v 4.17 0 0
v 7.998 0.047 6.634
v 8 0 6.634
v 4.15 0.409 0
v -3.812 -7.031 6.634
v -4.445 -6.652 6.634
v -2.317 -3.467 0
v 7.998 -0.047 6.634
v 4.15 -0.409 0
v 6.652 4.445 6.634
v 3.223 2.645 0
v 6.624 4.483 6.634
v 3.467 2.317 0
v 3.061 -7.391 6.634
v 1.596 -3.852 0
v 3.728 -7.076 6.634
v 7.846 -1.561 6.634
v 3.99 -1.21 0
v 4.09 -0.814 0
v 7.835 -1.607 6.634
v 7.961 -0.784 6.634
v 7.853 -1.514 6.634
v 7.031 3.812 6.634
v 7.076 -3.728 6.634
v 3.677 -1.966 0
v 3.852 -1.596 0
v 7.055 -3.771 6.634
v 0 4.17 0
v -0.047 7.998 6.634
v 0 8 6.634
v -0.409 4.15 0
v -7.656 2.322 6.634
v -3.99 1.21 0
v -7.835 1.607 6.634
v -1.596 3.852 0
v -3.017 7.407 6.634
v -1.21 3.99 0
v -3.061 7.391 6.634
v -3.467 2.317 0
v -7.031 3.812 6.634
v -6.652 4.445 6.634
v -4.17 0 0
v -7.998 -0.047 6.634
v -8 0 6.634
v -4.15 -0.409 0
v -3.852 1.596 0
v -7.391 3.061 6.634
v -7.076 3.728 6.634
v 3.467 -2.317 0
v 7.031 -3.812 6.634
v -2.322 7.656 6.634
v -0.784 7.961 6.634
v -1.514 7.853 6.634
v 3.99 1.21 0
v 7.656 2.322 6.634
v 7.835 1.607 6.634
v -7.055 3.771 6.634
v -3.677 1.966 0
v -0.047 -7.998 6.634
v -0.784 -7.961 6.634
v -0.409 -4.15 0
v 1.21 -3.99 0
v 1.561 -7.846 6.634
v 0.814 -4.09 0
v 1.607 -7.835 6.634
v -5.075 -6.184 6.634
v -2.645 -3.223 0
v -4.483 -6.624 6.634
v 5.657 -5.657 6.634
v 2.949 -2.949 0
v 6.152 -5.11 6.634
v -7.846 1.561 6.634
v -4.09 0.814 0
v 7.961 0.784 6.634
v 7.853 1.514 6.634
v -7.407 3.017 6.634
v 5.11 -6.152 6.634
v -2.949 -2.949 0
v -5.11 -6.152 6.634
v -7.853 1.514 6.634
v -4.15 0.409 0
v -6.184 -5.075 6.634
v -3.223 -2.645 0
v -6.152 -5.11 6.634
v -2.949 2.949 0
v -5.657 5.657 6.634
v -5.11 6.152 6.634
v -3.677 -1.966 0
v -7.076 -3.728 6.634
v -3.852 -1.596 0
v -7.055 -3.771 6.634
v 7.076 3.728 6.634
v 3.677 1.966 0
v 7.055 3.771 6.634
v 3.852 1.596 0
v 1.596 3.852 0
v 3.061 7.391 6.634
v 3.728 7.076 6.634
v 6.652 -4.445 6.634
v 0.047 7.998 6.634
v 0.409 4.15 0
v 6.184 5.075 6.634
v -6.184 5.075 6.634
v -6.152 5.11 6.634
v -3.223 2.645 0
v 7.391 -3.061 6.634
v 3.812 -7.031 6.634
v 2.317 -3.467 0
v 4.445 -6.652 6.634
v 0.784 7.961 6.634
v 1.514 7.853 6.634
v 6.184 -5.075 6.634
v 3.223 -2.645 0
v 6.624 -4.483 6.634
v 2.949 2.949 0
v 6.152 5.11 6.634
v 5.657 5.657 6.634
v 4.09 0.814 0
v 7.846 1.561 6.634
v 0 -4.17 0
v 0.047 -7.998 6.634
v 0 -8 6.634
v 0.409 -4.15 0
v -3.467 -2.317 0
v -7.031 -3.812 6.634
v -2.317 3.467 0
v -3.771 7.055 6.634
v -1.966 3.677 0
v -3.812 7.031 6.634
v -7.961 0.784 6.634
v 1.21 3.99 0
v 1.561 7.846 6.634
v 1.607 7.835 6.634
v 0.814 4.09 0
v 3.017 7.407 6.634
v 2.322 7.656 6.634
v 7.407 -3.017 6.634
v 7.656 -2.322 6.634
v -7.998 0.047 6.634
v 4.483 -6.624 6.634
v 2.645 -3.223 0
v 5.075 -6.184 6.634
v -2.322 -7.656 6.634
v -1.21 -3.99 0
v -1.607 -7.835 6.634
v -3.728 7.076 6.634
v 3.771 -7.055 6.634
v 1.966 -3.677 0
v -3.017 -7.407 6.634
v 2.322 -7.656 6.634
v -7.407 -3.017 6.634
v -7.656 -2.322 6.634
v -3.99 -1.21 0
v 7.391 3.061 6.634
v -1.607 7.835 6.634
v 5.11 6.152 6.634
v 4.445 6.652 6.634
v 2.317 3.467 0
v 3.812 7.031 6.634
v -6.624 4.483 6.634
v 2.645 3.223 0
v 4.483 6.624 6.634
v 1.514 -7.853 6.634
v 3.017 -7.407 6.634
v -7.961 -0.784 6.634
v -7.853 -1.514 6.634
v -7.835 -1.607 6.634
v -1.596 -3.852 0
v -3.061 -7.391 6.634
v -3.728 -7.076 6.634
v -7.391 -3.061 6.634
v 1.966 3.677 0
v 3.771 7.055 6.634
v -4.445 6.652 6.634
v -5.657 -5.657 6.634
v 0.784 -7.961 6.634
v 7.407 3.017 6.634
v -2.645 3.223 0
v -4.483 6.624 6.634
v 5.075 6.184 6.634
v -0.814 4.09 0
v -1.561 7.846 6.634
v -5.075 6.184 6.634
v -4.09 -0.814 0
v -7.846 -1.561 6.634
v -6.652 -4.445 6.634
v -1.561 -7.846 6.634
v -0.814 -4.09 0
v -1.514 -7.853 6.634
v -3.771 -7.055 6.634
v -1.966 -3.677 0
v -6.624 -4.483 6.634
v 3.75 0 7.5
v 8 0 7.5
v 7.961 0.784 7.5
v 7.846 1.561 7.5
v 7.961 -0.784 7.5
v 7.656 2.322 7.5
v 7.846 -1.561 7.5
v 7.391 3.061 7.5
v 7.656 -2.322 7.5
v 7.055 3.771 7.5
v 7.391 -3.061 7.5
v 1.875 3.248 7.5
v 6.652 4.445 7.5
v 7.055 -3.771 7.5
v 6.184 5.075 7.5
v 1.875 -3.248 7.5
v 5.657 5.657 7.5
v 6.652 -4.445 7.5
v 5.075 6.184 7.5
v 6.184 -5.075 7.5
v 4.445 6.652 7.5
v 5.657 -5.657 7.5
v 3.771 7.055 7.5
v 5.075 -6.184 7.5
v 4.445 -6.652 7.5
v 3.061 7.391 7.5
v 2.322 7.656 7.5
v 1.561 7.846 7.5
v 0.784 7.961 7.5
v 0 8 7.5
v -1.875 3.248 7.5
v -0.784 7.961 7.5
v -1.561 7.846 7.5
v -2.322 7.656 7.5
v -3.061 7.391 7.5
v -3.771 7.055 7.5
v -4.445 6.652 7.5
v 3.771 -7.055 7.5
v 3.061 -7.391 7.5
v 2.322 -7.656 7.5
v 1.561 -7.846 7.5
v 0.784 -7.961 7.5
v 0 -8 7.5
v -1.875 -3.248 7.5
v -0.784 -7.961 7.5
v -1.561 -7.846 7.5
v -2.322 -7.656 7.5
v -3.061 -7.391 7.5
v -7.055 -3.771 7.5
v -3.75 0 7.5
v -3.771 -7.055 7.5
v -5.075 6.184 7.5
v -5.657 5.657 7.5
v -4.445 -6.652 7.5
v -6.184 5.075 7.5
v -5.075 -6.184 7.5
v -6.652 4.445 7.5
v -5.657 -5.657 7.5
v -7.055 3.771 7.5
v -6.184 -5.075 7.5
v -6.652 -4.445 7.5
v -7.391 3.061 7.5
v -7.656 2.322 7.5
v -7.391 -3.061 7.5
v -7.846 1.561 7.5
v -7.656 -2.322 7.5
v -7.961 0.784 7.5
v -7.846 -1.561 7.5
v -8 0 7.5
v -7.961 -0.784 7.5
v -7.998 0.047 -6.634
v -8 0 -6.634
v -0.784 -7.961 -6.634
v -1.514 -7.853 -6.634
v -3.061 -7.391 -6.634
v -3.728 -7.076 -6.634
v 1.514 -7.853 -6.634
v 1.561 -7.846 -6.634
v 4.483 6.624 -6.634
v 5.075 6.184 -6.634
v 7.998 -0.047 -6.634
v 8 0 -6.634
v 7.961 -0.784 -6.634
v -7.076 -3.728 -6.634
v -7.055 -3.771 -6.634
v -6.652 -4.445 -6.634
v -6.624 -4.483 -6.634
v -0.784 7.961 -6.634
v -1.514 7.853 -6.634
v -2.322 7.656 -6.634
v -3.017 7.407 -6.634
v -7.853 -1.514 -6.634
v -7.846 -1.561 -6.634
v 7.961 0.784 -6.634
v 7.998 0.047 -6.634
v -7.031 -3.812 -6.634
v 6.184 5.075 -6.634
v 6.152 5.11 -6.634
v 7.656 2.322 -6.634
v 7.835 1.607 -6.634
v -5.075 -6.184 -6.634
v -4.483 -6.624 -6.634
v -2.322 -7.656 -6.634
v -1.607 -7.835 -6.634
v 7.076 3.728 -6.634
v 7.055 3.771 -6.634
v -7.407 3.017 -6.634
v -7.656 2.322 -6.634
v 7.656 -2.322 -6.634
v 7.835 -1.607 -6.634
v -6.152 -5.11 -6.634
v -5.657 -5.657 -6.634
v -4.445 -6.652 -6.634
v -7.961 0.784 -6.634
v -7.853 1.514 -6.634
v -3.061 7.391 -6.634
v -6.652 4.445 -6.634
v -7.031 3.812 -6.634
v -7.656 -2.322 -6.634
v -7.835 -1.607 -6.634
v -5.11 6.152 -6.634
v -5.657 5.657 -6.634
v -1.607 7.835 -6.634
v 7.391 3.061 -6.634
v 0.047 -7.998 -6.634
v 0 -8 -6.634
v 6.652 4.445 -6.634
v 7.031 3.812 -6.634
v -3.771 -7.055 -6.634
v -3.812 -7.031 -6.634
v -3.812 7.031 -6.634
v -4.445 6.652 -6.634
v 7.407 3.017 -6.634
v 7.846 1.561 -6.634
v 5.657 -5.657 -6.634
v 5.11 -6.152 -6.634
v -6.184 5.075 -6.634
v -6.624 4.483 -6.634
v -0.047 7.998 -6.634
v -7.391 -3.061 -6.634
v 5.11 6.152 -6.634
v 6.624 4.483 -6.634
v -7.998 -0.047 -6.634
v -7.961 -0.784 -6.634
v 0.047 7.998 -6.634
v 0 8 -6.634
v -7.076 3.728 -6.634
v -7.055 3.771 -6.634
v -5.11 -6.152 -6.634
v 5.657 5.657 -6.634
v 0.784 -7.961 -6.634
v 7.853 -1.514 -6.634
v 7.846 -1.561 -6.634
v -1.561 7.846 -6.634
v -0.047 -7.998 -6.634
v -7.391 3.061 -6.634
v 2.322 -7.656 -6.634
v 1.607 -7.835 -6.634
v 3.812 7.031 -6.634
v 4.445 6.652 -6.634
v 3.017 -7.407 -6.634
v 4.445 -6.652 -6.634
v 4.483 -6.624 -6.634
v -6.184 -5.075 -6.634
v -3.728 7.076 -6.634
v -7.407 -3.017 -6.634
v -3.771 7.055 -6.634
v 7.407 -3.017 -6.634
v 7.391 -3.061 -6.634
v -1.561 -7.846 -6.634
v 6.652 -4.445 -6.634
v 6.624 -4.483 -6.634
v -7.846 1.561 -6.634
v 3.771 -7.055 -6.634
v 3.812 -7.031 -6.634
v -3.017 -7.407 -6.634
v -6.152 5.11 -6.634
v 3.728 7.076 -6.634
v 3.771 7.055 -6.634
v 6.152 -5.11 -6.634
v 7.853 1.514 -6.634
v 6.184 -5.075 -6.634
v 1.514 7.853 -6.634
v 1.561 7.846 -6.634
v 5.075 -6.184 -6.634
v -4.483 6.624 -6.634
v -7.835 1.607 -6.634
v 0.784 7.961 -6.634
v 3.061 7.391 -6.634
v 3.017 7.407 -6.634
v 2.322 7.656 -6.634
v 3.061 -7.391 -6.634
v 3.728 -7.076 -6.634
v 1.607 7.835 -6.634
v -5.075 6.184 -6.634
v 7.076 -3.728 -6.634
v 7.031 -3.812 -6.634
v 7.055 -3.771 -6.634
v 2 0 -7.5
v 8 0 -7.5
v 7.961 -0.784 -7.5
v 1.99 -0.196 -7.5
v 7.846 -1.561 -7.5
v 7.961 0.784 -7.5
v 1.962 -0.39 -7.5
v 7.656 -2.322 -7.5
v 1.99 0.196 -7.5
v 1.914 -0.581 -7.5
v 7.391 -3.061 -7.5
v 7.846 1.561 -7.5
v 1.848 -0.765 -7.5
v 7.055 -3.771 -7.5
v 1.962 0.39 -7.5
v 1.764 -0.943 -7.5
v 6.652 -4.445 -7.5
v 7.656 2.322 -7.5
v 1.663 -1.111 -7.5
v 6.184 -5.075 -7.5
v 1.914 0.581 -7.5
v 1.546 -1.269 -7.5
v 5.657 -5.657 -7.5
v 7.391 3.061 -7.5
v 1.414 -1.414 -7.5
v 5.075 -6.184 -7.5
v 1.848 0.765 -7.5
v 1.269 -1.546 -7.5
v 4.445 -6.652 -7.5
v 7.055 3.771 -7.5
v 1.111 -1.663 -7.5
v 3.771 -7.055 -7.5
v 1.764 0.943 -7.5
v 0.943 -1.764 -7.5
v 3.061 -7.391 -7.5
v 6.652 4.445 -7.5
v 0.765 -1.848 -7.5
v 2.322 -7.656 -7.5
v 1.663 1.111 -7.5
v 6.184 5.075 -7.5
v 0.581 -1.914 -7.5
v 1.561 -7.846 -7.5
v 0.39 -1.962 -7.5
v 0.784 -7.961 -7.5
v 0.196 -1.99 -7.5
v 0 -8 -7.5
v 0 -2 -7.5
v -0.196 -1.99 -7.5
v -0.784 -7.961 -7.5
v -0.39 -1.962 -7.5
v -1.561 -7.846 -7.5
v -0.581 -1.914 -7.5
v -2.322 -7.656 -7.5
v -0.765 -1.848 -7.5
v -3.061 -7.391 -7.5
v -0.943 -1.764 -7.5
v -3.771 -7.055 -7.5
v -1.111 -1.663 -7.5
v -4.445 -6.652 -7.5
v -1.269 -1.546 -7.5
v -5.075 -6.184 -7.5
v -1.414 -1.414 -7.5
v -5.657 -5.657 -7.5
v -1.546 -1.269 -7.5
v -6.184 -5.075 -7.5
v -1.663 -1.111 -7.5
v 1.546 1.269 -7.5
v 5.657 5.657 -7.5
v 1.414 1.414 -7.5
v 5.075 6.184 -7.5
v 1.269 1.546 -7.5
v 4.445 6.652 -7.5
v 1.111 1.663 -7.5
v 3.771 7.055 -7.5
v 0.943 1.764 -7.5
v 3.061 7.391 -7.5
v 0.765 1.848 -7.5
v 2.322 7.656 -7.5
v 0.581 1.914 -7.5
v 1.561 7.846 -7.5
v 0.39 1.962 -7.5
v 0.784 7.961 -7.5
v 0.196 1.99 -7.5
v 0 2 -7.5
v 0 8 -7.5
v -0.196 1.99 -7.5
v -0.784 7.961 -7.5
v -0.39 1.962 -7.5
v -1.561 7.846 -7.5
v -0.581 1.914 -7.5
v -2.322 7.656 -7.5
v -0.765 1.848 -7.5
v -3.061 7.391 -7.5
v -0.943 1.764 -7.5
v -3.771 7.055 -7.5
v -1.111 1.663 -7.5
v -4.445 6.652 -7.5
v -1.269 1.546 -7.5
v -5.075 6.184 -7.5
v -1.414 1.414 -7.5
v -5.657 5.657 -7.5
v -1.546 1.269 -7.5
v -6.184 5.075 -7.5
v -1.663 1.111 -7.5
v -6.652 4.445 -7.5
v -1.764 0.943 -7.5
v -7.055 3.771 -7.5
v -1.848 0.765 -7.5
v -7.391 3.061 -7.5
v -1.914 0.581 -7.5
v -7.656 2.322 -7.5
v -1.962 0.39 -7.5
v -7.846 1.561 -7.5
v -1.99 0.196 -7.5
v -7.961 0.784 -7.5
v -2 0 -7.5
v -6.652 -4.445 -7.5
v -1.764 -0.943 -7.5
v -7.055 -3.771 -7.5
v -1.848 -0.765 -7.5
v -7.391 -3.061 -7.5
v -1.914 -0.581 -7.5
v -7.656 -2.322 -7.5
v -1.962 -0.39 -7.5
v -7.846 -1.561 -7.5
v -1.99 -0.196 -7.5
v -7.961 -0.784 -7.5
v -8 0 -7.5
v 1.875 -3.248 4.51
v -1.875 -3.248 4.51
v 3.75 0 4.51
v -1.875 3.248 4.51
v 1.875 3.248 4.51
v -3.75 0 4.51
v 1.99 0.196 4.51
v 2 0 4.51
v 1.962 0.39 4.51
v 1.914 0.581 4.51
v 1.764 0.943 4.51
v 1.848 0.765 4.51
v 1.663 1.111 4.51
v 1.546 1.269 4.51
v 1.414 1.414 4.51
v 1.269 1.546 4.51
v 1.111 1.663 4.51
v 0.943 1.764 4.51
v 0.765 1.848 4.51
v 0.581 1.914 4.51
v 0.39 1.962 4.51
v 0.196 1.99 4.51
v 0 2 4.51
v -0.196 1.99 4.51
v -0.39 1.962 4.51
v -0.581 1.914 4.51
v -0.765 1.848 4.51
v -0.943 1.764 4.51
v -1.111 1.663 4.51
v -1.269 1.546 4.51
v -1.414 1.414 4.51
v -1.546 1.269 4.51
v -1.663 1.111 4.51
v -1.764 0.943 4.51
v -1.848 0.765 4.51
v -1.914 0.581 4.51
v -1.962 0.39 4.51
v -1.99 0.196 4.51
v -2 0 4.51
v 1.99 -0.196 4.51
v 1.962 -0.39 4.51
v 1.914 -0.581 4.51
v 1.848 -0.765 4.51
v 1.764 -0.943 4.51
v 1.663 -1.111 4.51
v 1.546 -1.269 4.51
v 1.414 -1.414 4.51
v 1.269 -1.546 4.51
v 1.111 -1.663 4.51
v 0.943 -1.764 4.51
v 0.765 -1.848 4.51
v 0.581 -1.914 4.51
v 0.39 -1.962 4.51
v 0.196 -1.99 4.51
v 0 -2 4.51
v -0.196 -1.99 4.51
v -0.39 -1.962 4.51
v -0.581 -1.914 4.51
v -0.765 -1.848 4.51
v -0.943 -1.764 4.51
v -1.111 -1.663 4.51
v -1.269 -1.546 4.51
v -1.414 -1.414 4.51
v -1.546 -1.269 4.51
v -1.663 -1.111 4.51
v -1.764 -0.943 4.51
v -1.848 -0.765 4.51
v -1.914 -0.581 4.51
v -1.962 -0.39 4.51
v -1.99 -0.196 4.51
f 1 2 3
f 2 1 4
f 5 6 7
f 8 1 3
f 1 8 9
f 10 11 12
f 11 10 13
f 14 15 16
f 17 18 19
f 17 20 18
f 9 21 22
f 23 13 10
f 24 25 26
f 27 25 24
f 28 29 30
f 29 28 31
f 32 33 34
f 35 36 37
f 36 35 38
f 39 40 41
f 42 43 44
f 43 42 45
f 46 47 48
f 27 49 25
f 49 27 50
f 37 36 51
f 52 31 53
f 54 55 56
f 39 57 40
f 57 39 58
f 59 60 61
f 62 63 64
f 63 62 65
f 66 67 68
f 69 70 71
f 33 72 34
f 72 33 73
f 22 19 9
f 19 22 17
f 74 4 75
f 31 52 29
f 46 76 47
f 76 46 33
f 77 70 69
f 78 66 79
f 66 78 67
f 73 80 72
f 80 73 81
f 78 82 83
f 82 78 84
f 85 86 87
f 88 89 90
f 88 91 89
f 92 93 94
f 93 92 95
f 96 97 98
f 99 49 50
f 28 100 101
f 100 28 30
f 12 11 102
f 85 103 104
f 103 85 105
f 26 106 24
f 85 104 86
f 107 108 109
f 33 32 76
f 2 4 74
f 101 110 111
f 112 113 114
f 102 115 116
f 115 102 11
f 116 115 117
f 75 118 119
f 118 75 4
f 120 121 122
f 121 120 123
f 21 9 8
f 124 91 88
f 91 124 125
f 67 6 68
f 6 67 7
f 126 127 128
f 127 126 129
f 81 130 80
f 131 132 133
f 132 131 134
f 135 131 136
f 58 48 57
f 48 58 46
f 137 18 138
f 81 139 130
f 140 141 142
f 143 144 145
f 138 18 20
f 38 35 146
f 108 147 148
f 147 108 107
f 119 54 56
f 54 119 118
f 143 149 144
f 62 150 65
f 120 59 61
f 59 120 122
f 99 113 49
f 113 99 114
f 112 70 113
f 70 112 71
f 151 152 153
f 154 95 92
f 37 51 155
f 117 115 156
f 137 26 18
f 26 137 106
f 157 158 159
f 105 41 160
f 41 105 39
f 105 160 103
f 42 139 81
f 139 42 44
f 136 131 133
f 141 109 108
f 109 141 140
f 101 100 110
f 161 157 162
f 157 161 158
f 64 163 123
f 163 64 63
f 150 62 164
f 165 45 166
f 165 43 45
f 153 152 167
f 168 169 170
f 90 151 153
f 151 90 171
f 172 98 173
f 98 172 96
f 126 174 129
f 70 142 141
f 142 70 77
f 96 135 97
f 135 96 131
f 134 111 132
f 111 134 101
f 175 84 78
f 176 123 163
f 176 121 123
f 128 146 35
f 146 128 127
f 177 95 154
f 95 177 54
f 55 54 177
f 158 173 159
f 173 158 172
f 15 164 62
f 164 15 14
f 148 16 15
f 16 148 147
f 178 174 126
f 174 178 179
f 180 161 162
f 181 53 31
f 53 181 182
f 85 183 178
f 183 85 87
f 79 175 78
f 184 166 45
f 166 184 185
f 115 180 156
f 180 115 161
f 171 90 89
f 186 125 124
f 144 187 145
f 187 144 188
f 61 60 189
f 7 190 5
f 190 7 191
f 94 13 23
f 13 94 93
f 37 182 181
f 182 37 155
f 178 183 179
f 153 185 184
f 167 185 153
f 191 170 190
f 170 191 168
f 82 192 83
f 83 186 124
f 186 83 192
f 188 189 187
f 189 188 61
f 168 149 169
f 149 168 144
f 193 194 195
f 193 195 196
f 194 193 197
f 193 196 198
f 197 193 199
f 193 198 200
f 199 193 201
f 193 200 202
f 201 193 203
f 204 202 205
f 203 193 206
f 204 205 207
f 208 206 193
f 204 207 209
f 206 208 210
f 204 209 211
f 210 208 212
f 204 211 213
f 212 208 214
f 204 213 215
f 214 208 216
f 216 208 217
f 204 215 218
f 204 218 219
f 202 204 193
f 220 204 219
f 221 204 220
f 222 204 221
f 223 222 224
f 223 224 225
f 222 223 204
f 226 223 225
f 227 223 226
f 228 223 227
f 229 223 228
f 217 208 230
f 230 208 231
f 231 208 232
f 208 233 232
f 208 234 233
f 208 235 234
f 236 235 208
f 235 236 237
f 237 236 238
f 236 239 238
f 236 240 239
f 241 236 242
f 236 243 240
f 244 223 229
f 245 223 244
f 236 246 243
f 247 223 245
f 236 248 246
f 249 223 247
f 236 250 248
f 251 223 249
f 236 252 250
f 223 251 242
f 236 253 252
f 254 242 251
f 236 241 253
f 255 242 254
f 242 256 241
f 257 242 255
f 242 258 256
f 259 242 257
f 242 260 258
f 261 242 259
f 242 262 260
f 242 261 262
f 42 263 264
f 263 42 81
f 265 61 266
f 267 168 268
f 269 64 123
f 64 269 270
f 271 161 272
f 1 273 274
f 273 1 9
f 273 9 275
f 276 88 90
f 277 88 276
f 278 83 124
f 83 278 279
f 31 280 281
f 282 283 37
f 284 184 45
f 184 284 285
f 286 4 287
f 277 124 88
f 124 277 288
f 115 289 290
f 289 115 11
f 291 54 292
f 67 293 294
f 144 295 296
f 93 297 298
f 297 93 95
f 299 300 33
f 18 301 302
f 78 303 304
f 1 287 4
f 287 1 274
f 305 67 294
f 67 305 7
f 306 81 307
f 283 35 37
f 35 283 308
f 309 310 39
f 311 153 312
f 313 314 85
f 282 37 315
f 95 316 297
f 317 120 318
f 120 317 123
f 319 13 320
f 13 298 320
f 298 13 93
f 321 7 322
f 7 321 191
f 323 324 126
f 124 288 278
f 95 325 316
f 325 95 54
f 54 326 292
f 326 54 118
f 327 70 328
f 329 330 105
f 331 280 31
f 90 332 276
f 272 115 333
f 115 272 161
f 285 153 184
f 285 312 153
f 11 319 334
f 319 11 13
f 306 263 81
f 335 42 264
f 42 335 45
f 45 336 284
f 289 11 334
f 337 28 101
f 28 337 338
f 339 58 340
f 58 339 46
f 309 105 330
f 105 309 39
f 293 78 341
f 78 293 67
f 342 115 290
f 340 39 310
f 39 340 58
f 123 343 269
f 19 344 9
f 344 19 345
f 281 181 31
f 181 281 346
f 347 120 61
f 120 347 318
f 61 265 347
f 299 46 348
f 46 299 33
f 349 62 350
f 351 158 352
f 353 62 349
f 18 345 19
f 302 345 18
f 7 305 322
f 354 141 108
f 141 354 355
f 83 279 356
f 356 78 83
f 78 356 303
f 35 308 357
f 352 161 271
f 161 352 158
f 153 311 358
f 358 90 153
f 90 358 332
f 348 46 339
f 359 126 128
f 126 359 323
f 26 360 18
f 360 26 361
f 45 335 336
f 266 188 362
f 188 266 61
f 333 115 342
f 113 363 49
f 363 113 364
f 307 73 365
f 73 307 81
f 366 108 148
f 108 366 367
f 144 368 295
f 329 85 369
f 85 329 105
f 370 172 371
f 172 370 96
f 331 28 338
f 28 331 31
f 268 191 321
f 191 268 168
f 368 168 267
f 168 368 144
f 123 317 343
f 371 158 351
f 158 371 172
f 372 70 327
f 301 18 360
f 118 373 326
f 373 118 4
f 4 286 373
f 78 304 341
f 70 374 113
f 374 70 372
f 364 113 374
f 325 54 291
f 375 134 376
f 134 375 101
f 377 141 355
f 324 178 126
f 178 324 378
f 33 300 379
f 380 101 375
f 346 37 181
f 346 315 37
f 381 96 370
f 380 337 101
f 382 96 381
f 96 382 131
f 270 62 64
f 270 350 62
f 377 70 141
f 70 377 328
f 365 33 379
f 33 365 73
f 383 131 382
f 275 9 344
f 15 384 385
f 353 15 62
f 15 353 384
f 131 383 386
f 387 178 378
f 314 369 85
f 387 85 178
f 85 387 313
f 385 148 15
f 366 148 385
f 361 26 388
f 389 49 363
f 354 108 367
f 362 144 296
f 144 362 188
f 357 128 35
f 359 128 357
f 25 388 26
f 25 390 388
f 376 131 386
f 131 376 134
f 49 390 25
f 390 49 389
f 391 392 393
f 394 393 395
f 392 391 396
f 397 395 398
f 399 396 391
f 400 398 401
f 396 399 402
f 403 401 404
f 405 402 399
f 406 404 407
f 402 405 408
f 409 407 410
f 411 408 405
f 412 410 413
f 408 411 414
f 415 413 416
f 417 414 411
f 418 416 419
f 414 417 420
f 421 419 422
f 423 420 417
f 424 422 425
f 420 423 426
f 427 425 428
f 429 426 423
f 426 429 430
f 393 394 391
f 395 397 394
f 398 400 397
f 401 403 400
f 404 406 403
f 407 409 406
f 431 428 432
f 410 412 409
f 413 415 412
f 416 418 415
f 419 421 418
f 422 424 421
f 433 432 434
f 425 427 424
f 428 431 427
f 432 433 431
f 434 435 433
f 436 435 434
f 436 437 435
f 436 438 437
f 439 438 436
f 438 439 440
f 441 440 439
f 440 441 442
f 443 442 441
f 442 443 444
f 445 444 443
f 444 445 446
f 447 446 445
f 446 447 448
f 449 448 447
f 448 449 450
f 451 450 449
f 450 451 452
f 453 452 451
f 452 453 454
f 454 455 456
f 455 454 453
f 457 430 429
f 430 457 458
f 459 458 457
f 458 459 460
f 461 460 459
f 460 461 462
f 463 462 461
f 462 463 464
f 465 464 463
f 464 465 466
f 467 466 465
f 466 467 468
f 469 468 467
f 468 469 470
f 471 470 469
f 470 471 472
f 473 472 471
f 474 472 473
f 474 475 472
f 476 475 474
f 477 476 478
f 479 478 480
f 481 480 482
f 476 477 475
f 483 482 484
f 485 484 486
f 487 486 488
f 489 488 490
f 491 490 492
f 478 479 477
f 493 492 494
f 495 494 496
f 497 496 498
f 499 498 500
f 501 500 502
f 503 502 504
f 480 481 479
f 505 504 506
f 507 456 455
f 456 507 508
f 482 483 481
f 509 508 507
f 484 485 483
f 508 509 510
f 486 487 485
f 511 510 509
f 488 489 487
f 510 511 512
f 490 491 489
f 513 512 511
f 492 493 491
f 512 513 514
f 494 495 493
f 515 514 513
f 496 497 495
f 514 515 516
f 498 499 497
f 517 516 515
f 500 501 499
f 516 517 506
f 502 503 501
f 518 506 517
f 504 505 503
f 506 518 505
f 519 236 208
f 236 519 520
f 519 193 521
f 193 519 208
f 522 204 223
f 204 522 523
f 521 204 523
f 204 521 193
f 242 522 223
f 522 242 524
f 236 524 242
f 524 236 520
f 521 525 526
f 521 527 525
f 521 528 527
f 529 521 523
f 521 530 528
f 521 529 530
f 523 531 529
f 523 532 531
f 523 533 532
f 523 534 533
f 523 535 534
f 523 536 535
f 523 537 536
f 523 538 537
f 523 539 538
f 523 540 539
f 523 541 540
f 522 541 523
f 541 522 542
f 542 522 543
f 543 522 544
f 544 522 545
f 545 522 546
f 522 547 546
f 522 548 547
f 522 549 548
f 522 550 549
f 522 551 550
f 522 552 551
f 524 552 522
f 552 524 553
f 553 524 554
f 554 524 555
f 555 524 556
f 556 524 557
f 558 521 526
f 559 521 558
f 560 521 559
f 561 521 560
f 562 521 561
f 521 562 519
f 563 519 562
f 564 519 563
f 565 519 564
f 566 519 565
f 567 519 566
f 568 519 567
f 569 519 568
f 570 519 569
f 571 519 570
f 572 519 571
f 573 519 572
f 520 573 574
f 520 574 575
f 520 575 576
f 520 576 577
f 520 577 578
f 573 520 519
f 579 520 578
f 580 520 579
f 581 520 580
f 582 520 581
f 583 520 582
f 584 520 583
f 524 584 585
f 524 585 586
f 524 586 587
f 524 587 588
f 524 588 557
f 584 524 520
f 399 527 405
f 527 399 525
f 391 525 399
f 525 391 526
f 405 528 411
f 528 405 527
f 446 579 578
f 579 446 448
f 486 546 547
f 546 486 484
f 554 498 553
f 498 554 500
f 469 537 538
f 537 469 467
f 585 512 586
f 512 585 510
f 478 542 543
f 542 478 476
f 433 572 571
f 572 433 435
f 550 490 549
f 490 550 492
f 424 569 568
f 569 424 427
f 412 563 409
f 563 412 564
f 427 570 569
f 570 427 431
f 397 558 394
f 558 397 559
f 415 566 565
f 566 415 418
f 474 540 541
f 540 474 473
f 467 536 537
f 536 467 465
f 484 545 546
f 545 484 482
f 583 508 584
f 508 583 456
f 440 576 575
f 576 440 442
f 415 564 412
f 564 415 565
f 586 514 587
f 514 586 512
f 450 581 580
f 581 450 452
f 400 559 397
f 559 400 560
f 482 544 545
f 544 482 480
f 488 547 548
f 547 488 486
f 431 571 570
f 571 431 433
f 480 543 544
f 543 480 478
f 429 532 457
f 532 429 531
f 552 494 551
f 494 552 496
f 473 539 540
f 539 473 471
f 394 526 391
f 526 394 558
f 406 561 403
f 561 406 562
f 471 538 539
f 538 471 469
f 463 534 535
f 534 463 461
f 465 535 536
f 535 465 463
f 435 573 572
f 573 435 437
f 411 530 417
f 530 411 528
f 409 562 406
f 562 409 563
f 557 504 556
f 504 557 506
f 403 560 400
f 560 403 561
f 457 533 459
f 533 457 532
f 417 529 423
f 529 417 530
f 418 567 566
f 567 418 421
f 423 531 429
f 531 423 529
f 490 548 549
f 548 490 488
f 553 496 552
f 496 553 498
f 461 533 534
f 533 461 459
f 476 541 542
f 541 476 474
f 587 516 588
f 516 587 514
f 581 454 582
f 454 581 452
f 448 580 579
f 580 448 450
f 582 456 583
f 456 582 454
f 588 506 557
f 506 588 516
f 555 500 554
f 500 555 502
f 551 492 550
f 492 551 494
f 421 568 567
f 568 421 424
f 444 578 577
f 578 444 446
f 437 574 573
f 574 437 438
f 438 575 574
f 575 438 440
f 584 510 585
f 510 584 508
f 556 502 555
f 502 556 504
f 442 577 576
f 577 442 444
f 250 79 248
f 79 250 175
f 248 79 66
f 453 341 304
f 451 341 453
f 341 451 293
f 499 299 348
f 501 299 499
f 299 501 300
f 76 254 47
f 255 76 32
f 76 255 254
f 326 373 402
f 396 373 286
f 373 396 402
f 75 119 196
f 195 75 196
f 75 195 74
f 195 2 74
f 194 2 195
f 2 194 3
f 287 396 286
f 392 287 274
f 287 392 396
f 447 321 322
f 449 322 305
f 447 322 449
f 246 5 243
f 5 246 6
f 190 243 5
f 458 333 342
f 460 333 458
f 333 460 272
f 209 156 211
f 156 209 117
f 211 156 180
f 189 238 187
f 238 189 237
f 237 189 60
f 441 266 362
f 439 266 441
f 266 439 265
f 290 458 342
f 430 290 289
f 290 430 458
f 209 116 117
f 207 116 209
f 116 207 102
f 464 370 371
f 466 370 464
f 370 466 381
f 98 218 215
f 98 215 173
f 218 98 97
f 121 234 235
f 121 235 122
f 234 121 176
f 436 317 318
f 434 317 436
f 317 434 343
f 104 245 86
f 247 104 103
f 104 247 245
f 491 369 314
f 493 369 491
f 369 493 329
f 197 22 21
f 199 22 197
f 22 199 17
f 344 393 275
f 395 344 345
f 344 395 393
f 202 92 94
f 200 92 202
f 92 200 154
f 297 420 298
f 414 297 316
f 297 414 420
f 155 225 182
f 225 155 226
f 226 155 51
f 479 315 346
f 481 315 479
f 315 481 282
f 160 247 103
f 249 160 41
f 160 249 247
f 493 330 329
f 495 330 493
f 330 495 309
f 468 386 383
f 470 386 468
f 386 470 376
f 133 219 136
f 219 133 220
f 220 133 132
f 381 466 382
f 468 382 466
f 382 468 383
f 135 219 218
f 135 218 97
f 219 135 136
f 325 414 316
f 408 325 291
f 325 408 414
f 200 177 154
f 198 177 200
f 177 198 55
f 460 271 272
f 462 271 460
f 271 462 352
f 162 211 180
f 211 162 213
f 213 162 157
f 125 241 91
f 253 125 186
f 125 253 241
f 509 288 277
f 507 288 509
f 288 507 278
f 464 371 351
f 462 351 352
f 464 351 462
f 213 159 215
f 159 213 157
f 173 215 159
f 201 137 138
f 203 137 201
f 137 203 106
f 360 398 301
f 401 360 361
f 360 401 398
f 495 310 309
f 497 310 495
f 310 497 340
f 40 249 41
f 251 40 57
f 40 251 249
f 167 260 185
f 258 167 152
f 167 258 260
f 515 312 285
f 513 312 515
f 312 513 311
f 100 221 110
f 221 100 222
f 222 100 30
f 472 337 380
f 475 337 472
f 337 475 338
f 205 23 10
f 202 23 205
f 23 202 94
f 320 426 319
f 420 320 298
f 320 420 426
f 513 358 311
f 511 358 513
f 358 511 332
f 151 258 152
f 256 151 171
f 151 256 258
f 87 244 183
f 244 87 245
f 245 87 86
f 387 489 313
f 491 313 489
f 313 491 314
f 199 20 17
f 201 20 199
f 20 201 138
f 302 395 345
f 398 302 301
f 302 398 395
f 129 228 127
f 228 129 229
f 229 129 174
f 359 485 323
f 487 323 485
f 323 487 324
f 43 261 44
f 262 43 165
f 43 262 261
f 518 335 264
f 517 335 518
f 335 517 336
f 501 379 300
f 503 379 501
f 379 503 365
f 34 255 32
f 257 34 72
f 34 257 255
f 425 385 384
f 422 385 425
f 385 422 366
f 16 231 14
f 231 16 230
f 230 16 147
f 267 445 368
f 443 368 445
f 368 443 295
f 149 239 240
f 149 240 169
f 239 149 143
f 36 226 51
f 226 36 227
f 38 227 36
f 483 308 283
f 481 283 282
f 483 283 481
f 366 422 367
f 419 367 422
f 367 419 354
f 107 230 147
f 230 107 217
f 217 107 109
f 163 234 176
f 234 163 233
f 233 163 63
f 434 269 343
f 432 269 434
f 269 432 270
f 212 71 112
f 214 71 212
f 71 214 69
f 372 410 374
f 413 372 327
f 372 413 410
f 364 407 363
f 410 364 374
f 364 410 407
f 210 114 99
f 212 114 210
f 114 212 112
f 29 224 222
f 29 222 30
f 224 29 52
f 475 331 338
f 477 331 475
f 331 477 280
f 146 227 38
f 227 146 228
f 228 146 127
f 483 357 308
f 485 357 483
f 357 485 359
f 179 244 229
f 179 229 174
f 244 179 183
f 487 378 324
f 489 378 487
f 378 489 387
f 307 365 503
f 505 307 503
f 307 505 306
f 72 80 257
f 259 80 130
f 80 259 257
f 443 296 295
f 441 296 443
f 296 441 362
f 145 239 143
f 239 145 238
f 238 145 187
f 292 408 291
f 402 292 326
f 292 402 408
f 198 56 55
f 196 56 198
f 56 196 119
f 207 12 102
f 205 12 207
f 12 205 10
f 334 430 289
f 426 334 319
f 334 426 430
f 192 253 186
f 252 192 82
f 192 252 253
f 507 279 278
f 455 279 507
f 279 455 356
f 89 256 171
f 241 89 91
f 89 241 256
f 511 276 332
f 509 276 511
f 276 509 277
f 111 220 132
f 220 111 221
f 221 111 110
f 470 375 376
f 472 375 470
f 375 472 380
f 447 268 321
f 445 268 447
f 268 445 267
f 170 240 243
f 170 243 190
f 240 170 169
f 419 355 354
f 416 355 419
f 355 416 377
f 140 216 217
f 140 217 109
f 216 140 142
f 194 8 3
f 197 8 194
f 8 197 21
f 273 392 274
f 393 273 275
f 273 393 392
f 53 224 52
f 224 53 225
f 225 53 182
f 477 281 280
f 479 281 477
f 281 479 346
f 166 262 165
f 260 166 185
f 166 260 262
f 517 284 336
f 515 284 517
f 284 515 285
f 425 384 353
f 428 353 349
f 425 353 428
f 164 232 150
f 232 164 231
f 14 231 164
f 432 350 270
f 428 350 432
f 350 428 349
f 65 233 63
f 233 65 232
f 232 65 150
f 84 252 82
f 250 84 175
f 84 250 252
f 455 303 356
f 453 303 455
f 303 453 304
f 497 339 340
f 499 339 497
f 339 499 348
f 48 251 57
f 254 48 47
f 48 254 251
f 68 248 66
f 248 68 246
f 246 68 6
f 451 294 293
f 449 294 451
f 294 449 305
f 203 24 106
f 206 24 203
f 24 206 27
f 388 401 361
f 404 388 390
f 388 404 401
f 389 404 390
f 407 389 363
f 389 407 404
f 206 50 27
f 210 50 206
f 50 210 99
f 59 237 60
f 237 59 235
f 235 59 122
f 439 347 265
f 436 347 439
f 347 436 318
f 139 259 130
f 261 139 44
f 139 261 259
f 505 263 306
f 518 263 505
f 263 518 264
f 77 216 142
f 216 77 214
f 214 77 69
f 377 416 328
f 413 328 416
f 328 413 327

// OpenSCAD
//Revision 1.0 released 1 SEPT 15
//by Siti



//Desired height of hanger
Height = 15;
//Desired Overall Dimension for hanger
OD = 16;
//Measured Overall Dimension of thread
Thread_OD = 3;

threadTol = 6*1;
//Measured diameter of nut (across corners)
Nut_OD = 6.7;
//Number of sides of nut
Nut_Sides = 6; //[4,6]
//Depth of nut
Nut_Depth = 3;
//Clearance around thread, no need to touch this unless you're having clearance issues.
Thread_Clearance = 1;
//Clearance around nut, no need to touch this unless you're having clearance issues.
Nut_Clearance =0.8;
NutCutoutD = Nut_OD+Nut_Clearance;
//angle of guide from vertical. Probably no need to touch this.
Angle = 30;

fudge = 0.01*1;
edge=1*1;

GrooveR = (edge+OD)/2-(tan(Angle)*(Height/2));

intersection()
{
difference()
{
    //things to add
    union()
    {
        //top cone
        translate([0,0,Height/4])cylinder( r2 = (OD+edge)/2, r1 = GrooveR, center=true, h = Height/2,$fn=64);
        //bottom cone
         rotate([0,180,0])translate([0,0,Height/4])cylinder( r2 = (OD+edge)/2, r1 = GrooveR, center=true, h = Height/2,$fn=64);
        
    };
    
    //things to subtract
    union()
    {
       translate([0,0,Height/2-Nut_Depth/2+fudge])cylinder(d=NutCutoutD, h = Nut_Depth,center=true, $fn=Nut_Sides); 
        
        cylinder(h = Height+fudge,d=Thread_OD+Thread_Clearance,center=true,$fn=64);
    };
    
}

cylinder(h=Height,d=OD,center=true,$fn=64);

}
